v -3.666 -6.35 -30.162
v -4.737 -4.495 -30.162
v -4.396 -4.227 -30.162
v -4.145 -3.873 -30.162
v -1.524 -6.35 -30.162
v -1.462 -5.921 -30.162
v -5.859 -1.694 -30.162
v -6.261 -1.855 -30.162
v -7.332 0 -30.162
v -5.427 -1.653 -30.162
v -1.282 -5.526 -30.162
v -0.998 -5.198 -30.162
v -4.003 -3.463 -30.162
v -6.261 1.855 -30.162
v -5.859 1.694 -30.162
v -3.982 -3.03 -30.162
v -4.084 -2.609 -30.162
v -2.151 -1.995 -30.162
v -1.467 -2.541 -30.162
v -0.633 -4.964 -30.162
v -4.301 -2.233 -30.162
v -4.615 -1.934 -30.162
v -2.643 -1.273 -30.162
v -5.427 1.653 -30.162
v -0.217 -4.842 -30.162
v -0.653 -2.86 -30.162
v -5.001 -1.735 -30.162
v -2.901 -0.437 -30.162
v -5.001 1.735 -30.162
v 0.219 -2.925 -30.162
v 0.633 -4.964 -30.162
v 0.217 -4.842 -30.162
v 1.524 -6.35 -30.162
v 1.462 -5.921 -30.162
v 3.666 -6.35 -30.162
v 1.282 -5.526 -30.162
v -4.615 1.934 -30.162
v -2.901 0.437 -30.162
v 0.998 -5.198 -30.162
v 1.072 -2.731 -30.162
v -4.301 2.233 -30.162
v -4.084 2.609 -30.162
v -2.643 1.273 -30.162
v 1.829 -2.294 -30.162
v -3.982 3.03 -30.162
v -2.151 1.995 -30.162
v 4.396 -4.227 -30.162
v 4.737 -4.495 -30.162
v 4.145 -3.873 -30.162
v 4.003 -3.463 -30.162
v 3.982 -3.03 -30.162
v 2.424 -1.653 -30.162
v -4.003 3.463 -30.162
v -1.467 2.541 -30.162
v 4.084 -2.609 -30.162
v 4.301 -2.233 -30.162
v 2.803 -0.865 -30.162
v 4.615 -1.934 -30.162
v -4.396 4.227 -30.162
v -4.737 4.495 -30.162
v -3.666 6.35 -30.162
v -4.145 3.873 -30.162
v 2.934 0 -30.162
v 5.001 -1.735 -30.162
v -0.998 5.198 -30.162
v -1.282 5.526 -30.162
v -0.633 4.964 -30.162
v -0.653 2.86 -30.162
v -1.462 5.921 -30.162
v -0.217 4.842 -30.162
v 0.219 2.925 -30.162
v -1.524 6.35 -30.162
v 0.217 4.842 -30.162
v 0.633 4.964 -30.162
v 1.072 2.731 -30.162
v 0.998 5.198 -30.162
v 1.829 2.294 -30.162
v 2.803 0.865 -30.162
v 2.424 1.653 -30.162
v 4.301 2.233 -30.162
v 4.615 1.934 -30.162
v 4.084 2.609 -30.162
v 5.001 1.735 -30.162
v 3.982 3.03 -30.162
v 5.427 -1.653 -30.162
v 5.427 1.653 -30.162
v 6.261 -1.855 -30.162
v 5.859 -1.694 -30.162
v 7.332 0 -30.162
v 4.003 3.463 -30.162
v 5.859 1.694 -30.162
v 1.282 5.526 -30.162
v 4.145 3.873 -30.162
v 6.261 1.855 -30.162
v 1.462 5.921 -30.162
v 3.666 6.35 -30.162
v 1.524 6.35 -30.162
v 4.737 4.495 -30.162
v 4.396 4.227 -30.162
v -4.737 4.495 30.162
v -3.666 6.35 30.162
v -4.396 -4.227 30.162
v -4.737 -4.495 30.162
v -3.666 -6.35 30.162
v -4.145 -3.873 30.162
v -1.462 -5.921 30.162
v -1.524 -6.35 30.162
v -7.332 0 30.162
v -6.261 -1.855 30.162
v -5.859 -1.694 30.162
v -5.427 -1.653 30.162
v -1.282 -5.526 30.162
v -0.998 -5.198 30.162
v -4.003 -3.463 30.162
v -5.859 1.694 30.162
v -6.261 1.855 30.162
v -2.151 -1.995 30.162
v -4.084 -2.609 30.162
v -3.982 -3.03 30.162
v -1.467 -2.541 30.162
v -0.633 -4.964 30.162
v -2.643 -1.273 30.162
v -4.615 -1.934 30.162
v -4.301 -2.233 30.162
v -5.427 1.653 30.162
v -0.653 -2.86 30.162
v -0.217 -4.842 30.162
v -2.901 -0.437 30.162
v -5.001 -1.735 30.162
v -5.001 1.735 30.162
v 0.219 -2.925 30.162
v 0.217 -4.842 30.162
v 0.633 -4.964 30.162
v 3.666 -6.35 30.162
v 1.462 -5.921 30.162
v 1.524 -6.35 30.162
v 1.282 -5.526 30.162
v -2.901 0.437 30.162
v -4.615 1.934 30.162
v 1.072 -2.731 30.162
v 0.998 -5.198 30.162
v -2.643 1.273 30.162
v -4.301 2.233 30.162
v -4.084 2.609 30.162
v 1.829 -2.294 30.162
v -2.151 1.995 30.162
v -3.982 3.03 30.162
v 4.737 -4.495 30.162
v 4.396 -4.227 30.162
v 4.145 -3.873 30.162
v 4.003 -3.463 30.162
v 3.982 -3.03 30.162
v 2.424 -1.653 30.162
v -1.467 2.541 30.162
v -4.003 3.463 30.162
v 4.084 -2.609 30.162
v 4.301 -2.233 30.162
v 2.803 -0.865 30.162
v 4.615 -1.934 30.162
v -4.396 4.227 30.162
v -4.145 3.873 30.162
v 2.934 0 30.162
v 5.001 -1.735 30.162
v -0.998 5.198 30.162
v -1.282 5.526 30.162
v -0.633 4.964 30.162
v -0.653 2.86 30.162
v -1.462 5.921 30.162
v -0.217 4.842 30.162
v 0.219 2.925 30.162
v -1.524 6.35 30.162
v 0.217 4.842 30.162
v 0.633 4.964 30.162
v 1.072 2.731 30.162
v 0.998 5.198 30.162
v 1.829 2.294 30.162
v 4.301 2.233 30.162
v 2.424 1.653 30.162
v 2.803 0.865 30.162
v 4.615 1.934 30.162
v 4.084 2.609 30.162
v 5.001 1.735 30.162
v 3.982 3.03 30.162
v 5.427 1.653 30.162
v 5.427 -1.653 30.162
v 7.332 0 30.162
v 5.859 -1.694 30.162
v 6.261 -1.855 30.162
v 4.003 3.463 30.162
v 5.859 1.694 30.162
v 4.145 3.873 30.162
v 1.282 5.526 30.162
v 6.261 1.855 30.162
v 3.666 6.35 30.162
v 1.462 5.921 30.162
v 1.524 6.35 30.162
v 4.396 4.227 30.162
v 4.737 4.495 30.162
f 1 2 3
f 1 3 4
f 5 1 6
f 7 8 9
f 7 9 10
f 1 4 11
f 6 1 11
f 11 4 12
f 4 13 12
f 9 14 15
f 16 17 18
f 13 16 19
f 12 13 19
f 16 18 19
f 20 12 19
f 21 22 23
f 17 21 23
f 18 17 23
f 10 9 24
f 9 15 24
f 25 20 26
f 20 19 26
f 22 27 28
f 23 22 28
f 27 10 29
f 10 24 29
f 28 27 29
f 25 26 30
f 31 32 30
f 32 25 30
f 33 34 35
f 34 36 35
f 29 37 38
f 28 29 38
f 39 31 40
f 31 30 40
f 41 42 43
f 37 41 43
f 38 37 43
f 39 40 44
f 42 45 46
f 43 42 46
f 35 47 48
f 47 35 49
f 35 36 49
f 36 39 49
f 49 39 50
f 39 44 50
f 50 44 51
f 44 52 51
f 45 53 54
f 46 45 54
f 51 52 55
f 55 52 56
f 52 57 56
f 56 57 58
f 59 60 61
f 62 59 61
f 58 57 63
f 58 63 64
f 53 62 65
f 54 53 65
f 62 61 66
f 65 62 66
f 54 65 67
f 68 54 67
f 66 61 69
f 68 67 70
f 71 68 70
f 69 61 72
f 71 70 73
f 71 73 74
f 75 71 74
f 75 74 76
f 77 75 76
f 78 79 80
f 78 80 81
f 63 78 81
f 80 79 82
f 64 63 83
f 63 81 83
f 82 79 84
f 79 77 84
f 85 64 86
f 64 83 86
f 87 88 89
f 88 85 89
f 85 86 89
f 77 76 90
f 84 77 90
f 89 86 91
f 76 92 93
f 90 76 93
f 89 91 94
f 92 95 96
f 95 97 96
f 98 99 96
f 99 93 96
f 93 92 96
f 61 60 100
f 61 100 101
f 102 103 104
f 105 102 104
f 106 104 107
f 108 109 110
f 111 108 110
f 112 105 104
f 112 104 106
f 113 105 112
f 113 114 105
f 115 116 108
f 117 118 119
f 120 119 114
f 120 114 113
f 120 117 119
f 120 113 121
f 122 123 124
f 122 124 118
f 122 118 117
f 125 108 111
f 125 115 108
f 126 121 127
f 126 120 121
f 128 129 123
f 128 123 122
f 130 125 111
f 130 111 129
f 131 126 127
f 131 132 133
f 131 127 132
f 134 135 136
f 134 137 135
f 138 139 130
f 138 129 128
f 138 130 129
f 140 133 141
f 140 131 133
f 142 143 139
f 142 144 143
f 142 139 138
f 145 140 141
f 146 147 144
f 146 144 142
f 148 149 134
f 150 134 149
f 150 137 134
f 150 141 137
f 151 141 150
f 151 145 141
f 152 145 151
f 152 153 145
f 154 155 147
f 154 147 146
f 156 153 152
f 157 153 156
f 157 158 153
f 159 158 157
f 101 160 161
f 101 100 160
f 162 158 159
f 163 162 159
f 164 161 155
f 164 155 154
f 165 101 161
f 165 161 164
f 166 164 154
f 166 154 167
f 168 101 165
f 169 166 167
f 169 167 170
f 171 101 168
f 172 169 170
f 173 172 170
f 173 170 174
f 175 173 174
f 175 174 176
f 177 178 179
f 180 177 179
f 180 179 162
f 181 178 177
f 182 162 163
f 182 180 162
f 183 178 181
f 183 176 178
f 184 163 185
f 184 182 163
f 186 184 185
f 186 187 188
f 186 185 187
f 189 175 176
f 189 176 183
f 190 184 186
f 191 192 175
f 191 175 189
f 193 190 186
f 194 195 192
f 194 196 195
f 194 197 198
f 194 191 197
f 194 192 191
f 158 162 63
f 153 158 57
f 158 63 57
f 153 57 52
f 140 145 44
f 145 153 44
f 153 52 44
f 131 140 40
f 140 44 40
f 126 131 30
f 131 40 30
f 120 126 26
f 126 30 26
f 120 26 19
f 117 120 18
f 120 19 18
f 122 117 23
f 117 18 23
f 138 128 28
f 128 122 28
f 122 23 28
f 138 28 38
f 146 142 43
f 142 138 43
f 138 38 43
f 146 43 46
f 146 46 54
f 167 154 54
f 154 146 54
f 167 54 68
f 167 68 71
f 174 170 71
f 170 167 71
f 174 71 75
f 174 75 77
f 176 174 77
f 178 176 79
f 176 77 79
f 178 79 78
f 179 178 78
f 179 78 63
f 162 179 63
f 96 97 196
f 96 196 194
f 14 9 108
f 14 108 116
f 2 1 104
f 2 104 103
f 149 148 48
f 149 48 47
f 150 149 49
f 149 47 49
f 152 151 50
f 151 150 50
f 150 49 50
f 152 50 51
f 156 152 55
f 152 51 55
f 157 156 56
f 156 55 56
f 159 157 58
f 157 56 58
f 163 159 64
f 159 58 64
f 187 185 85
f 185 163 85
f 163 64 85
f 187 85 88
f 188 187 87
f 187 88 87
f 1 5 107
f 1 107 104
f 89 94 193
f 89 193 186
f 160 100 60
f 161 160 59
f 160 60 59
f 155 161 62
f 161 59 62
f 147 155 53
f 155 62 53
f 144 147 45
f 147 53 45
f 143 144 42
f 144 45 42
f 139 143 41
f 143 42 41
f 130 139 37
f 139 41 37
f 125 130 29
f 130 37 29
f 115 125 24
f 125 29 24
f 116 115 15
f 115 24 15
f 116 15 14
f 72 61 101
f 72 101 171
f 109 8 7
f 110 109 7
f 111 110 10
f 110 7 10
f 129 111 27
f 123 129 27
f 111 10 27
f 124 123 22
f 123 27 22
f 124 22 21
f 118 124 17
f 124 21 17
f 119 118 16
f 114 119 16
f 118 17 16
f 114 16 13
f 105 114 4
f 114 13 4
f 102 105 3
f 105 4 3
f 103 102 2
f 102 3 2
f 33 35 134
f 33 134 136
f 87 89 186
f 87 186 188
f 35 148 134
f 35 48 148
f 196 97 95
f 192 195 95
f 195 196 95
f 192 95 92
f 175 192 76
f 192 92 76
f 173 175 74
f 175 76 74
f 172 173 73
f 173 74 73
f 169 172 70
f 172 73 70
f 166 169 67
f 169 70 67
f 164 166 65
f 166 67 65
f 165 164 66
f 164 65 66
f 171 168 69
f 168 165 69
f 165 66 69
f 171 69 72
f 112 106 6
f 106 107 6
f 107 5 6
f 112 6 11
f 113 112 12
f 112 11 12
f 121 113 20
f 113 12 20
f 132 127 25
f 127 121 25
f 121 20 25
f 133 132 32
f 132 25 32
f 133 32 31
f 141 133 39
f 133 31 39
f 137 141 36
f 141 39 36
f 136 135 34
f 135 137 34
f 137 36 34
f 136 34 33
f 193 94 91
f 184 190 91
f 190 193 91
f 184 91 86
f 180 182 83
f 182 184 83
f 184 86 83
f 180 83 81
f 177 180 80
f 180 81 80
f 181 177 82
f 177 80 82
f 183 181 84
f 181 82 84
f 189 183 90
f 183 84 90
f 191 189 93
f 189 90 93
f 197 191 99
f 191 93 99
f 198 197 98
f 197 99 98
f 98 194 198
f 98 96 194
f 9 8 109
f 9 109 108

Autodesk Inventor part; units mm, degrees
ref_plane "YZ Plane" through (0, 0, 0) normal (1, 0, 0) x (0, 1, 0)
ref_plane "XZ Plane" through (0, 0, 0) normal (0, 1, 0) x (-1, 0, 0)
ref_plane "XY Plane" through (0, 0, 0) normal (0, 0, 1) x (1, 0, 0)
sketch "Sketch1" plane through (0, 0, 0) normal (0, 0, 1) x (1, 0, 0)
  line L0 (-7.3323, 0) -> (-3.6662, 6.35)
  line L1 (-3.6662, 6.35) -> (3.6662, 6.35)
  line L2 (3.6662, 6.35) -> (7.3323, 0)
  line L3 (7.3323, 0) -> (3.6662, -6.35)
  line L4 (3.6662, -6.35) -> (-3.6662, -6.35)
  line L5 (-3.6662, -6.35) -> (-7.3323, 0)
  circle A0 centre (0, 6.35) radius 1.524
  circle A1 centre (-5.4993, 3.175) radius 1.524
  circle A2 centre (-5.4993, -3.175) radius 1.524
  circle A3 centre (0, -6.35) radius 1.524
  circle A4 centre (5.4993, -3.175) radius 1.524
  circle A5 centre (5.4993, 3.175) radius 1.524
  circle A6 centre (0, 0) radius 2.9337
  point P0 (6.2613, 1.8552)
  point P1 (4.7373, 4.4948)
  point P2 (1.524, 6.35)
  point P3 (-1.524, 6.35)
  point P4 (-4.7373, 4.4948)
  point P5 (-6.2613, 1.8552)
  point P6 (-6.2613, -1.8552)
  point P7 (-4.7373, -4.4948)
  point P8 (-1.524, -6.35)
  point P9 (1.524, -6.35)
  point P10 (4.7373, -4.4948)
  point P11 (6.2613, -1.8552)
  dimension "d0" = 12.7
  dimension "d1" = 3.048
  dimension "d4" = 360
  dimension "d6" = 5.8674
extrude "Extrusion1" add sketch "Sketch1" along normal mid plane 60.325 contours L0 A1 L1 A0 L2 A5 L3 A4 L4 A3 L5 A2
properties part number "Configurable Kitbot Churro" material "Aluminum"
